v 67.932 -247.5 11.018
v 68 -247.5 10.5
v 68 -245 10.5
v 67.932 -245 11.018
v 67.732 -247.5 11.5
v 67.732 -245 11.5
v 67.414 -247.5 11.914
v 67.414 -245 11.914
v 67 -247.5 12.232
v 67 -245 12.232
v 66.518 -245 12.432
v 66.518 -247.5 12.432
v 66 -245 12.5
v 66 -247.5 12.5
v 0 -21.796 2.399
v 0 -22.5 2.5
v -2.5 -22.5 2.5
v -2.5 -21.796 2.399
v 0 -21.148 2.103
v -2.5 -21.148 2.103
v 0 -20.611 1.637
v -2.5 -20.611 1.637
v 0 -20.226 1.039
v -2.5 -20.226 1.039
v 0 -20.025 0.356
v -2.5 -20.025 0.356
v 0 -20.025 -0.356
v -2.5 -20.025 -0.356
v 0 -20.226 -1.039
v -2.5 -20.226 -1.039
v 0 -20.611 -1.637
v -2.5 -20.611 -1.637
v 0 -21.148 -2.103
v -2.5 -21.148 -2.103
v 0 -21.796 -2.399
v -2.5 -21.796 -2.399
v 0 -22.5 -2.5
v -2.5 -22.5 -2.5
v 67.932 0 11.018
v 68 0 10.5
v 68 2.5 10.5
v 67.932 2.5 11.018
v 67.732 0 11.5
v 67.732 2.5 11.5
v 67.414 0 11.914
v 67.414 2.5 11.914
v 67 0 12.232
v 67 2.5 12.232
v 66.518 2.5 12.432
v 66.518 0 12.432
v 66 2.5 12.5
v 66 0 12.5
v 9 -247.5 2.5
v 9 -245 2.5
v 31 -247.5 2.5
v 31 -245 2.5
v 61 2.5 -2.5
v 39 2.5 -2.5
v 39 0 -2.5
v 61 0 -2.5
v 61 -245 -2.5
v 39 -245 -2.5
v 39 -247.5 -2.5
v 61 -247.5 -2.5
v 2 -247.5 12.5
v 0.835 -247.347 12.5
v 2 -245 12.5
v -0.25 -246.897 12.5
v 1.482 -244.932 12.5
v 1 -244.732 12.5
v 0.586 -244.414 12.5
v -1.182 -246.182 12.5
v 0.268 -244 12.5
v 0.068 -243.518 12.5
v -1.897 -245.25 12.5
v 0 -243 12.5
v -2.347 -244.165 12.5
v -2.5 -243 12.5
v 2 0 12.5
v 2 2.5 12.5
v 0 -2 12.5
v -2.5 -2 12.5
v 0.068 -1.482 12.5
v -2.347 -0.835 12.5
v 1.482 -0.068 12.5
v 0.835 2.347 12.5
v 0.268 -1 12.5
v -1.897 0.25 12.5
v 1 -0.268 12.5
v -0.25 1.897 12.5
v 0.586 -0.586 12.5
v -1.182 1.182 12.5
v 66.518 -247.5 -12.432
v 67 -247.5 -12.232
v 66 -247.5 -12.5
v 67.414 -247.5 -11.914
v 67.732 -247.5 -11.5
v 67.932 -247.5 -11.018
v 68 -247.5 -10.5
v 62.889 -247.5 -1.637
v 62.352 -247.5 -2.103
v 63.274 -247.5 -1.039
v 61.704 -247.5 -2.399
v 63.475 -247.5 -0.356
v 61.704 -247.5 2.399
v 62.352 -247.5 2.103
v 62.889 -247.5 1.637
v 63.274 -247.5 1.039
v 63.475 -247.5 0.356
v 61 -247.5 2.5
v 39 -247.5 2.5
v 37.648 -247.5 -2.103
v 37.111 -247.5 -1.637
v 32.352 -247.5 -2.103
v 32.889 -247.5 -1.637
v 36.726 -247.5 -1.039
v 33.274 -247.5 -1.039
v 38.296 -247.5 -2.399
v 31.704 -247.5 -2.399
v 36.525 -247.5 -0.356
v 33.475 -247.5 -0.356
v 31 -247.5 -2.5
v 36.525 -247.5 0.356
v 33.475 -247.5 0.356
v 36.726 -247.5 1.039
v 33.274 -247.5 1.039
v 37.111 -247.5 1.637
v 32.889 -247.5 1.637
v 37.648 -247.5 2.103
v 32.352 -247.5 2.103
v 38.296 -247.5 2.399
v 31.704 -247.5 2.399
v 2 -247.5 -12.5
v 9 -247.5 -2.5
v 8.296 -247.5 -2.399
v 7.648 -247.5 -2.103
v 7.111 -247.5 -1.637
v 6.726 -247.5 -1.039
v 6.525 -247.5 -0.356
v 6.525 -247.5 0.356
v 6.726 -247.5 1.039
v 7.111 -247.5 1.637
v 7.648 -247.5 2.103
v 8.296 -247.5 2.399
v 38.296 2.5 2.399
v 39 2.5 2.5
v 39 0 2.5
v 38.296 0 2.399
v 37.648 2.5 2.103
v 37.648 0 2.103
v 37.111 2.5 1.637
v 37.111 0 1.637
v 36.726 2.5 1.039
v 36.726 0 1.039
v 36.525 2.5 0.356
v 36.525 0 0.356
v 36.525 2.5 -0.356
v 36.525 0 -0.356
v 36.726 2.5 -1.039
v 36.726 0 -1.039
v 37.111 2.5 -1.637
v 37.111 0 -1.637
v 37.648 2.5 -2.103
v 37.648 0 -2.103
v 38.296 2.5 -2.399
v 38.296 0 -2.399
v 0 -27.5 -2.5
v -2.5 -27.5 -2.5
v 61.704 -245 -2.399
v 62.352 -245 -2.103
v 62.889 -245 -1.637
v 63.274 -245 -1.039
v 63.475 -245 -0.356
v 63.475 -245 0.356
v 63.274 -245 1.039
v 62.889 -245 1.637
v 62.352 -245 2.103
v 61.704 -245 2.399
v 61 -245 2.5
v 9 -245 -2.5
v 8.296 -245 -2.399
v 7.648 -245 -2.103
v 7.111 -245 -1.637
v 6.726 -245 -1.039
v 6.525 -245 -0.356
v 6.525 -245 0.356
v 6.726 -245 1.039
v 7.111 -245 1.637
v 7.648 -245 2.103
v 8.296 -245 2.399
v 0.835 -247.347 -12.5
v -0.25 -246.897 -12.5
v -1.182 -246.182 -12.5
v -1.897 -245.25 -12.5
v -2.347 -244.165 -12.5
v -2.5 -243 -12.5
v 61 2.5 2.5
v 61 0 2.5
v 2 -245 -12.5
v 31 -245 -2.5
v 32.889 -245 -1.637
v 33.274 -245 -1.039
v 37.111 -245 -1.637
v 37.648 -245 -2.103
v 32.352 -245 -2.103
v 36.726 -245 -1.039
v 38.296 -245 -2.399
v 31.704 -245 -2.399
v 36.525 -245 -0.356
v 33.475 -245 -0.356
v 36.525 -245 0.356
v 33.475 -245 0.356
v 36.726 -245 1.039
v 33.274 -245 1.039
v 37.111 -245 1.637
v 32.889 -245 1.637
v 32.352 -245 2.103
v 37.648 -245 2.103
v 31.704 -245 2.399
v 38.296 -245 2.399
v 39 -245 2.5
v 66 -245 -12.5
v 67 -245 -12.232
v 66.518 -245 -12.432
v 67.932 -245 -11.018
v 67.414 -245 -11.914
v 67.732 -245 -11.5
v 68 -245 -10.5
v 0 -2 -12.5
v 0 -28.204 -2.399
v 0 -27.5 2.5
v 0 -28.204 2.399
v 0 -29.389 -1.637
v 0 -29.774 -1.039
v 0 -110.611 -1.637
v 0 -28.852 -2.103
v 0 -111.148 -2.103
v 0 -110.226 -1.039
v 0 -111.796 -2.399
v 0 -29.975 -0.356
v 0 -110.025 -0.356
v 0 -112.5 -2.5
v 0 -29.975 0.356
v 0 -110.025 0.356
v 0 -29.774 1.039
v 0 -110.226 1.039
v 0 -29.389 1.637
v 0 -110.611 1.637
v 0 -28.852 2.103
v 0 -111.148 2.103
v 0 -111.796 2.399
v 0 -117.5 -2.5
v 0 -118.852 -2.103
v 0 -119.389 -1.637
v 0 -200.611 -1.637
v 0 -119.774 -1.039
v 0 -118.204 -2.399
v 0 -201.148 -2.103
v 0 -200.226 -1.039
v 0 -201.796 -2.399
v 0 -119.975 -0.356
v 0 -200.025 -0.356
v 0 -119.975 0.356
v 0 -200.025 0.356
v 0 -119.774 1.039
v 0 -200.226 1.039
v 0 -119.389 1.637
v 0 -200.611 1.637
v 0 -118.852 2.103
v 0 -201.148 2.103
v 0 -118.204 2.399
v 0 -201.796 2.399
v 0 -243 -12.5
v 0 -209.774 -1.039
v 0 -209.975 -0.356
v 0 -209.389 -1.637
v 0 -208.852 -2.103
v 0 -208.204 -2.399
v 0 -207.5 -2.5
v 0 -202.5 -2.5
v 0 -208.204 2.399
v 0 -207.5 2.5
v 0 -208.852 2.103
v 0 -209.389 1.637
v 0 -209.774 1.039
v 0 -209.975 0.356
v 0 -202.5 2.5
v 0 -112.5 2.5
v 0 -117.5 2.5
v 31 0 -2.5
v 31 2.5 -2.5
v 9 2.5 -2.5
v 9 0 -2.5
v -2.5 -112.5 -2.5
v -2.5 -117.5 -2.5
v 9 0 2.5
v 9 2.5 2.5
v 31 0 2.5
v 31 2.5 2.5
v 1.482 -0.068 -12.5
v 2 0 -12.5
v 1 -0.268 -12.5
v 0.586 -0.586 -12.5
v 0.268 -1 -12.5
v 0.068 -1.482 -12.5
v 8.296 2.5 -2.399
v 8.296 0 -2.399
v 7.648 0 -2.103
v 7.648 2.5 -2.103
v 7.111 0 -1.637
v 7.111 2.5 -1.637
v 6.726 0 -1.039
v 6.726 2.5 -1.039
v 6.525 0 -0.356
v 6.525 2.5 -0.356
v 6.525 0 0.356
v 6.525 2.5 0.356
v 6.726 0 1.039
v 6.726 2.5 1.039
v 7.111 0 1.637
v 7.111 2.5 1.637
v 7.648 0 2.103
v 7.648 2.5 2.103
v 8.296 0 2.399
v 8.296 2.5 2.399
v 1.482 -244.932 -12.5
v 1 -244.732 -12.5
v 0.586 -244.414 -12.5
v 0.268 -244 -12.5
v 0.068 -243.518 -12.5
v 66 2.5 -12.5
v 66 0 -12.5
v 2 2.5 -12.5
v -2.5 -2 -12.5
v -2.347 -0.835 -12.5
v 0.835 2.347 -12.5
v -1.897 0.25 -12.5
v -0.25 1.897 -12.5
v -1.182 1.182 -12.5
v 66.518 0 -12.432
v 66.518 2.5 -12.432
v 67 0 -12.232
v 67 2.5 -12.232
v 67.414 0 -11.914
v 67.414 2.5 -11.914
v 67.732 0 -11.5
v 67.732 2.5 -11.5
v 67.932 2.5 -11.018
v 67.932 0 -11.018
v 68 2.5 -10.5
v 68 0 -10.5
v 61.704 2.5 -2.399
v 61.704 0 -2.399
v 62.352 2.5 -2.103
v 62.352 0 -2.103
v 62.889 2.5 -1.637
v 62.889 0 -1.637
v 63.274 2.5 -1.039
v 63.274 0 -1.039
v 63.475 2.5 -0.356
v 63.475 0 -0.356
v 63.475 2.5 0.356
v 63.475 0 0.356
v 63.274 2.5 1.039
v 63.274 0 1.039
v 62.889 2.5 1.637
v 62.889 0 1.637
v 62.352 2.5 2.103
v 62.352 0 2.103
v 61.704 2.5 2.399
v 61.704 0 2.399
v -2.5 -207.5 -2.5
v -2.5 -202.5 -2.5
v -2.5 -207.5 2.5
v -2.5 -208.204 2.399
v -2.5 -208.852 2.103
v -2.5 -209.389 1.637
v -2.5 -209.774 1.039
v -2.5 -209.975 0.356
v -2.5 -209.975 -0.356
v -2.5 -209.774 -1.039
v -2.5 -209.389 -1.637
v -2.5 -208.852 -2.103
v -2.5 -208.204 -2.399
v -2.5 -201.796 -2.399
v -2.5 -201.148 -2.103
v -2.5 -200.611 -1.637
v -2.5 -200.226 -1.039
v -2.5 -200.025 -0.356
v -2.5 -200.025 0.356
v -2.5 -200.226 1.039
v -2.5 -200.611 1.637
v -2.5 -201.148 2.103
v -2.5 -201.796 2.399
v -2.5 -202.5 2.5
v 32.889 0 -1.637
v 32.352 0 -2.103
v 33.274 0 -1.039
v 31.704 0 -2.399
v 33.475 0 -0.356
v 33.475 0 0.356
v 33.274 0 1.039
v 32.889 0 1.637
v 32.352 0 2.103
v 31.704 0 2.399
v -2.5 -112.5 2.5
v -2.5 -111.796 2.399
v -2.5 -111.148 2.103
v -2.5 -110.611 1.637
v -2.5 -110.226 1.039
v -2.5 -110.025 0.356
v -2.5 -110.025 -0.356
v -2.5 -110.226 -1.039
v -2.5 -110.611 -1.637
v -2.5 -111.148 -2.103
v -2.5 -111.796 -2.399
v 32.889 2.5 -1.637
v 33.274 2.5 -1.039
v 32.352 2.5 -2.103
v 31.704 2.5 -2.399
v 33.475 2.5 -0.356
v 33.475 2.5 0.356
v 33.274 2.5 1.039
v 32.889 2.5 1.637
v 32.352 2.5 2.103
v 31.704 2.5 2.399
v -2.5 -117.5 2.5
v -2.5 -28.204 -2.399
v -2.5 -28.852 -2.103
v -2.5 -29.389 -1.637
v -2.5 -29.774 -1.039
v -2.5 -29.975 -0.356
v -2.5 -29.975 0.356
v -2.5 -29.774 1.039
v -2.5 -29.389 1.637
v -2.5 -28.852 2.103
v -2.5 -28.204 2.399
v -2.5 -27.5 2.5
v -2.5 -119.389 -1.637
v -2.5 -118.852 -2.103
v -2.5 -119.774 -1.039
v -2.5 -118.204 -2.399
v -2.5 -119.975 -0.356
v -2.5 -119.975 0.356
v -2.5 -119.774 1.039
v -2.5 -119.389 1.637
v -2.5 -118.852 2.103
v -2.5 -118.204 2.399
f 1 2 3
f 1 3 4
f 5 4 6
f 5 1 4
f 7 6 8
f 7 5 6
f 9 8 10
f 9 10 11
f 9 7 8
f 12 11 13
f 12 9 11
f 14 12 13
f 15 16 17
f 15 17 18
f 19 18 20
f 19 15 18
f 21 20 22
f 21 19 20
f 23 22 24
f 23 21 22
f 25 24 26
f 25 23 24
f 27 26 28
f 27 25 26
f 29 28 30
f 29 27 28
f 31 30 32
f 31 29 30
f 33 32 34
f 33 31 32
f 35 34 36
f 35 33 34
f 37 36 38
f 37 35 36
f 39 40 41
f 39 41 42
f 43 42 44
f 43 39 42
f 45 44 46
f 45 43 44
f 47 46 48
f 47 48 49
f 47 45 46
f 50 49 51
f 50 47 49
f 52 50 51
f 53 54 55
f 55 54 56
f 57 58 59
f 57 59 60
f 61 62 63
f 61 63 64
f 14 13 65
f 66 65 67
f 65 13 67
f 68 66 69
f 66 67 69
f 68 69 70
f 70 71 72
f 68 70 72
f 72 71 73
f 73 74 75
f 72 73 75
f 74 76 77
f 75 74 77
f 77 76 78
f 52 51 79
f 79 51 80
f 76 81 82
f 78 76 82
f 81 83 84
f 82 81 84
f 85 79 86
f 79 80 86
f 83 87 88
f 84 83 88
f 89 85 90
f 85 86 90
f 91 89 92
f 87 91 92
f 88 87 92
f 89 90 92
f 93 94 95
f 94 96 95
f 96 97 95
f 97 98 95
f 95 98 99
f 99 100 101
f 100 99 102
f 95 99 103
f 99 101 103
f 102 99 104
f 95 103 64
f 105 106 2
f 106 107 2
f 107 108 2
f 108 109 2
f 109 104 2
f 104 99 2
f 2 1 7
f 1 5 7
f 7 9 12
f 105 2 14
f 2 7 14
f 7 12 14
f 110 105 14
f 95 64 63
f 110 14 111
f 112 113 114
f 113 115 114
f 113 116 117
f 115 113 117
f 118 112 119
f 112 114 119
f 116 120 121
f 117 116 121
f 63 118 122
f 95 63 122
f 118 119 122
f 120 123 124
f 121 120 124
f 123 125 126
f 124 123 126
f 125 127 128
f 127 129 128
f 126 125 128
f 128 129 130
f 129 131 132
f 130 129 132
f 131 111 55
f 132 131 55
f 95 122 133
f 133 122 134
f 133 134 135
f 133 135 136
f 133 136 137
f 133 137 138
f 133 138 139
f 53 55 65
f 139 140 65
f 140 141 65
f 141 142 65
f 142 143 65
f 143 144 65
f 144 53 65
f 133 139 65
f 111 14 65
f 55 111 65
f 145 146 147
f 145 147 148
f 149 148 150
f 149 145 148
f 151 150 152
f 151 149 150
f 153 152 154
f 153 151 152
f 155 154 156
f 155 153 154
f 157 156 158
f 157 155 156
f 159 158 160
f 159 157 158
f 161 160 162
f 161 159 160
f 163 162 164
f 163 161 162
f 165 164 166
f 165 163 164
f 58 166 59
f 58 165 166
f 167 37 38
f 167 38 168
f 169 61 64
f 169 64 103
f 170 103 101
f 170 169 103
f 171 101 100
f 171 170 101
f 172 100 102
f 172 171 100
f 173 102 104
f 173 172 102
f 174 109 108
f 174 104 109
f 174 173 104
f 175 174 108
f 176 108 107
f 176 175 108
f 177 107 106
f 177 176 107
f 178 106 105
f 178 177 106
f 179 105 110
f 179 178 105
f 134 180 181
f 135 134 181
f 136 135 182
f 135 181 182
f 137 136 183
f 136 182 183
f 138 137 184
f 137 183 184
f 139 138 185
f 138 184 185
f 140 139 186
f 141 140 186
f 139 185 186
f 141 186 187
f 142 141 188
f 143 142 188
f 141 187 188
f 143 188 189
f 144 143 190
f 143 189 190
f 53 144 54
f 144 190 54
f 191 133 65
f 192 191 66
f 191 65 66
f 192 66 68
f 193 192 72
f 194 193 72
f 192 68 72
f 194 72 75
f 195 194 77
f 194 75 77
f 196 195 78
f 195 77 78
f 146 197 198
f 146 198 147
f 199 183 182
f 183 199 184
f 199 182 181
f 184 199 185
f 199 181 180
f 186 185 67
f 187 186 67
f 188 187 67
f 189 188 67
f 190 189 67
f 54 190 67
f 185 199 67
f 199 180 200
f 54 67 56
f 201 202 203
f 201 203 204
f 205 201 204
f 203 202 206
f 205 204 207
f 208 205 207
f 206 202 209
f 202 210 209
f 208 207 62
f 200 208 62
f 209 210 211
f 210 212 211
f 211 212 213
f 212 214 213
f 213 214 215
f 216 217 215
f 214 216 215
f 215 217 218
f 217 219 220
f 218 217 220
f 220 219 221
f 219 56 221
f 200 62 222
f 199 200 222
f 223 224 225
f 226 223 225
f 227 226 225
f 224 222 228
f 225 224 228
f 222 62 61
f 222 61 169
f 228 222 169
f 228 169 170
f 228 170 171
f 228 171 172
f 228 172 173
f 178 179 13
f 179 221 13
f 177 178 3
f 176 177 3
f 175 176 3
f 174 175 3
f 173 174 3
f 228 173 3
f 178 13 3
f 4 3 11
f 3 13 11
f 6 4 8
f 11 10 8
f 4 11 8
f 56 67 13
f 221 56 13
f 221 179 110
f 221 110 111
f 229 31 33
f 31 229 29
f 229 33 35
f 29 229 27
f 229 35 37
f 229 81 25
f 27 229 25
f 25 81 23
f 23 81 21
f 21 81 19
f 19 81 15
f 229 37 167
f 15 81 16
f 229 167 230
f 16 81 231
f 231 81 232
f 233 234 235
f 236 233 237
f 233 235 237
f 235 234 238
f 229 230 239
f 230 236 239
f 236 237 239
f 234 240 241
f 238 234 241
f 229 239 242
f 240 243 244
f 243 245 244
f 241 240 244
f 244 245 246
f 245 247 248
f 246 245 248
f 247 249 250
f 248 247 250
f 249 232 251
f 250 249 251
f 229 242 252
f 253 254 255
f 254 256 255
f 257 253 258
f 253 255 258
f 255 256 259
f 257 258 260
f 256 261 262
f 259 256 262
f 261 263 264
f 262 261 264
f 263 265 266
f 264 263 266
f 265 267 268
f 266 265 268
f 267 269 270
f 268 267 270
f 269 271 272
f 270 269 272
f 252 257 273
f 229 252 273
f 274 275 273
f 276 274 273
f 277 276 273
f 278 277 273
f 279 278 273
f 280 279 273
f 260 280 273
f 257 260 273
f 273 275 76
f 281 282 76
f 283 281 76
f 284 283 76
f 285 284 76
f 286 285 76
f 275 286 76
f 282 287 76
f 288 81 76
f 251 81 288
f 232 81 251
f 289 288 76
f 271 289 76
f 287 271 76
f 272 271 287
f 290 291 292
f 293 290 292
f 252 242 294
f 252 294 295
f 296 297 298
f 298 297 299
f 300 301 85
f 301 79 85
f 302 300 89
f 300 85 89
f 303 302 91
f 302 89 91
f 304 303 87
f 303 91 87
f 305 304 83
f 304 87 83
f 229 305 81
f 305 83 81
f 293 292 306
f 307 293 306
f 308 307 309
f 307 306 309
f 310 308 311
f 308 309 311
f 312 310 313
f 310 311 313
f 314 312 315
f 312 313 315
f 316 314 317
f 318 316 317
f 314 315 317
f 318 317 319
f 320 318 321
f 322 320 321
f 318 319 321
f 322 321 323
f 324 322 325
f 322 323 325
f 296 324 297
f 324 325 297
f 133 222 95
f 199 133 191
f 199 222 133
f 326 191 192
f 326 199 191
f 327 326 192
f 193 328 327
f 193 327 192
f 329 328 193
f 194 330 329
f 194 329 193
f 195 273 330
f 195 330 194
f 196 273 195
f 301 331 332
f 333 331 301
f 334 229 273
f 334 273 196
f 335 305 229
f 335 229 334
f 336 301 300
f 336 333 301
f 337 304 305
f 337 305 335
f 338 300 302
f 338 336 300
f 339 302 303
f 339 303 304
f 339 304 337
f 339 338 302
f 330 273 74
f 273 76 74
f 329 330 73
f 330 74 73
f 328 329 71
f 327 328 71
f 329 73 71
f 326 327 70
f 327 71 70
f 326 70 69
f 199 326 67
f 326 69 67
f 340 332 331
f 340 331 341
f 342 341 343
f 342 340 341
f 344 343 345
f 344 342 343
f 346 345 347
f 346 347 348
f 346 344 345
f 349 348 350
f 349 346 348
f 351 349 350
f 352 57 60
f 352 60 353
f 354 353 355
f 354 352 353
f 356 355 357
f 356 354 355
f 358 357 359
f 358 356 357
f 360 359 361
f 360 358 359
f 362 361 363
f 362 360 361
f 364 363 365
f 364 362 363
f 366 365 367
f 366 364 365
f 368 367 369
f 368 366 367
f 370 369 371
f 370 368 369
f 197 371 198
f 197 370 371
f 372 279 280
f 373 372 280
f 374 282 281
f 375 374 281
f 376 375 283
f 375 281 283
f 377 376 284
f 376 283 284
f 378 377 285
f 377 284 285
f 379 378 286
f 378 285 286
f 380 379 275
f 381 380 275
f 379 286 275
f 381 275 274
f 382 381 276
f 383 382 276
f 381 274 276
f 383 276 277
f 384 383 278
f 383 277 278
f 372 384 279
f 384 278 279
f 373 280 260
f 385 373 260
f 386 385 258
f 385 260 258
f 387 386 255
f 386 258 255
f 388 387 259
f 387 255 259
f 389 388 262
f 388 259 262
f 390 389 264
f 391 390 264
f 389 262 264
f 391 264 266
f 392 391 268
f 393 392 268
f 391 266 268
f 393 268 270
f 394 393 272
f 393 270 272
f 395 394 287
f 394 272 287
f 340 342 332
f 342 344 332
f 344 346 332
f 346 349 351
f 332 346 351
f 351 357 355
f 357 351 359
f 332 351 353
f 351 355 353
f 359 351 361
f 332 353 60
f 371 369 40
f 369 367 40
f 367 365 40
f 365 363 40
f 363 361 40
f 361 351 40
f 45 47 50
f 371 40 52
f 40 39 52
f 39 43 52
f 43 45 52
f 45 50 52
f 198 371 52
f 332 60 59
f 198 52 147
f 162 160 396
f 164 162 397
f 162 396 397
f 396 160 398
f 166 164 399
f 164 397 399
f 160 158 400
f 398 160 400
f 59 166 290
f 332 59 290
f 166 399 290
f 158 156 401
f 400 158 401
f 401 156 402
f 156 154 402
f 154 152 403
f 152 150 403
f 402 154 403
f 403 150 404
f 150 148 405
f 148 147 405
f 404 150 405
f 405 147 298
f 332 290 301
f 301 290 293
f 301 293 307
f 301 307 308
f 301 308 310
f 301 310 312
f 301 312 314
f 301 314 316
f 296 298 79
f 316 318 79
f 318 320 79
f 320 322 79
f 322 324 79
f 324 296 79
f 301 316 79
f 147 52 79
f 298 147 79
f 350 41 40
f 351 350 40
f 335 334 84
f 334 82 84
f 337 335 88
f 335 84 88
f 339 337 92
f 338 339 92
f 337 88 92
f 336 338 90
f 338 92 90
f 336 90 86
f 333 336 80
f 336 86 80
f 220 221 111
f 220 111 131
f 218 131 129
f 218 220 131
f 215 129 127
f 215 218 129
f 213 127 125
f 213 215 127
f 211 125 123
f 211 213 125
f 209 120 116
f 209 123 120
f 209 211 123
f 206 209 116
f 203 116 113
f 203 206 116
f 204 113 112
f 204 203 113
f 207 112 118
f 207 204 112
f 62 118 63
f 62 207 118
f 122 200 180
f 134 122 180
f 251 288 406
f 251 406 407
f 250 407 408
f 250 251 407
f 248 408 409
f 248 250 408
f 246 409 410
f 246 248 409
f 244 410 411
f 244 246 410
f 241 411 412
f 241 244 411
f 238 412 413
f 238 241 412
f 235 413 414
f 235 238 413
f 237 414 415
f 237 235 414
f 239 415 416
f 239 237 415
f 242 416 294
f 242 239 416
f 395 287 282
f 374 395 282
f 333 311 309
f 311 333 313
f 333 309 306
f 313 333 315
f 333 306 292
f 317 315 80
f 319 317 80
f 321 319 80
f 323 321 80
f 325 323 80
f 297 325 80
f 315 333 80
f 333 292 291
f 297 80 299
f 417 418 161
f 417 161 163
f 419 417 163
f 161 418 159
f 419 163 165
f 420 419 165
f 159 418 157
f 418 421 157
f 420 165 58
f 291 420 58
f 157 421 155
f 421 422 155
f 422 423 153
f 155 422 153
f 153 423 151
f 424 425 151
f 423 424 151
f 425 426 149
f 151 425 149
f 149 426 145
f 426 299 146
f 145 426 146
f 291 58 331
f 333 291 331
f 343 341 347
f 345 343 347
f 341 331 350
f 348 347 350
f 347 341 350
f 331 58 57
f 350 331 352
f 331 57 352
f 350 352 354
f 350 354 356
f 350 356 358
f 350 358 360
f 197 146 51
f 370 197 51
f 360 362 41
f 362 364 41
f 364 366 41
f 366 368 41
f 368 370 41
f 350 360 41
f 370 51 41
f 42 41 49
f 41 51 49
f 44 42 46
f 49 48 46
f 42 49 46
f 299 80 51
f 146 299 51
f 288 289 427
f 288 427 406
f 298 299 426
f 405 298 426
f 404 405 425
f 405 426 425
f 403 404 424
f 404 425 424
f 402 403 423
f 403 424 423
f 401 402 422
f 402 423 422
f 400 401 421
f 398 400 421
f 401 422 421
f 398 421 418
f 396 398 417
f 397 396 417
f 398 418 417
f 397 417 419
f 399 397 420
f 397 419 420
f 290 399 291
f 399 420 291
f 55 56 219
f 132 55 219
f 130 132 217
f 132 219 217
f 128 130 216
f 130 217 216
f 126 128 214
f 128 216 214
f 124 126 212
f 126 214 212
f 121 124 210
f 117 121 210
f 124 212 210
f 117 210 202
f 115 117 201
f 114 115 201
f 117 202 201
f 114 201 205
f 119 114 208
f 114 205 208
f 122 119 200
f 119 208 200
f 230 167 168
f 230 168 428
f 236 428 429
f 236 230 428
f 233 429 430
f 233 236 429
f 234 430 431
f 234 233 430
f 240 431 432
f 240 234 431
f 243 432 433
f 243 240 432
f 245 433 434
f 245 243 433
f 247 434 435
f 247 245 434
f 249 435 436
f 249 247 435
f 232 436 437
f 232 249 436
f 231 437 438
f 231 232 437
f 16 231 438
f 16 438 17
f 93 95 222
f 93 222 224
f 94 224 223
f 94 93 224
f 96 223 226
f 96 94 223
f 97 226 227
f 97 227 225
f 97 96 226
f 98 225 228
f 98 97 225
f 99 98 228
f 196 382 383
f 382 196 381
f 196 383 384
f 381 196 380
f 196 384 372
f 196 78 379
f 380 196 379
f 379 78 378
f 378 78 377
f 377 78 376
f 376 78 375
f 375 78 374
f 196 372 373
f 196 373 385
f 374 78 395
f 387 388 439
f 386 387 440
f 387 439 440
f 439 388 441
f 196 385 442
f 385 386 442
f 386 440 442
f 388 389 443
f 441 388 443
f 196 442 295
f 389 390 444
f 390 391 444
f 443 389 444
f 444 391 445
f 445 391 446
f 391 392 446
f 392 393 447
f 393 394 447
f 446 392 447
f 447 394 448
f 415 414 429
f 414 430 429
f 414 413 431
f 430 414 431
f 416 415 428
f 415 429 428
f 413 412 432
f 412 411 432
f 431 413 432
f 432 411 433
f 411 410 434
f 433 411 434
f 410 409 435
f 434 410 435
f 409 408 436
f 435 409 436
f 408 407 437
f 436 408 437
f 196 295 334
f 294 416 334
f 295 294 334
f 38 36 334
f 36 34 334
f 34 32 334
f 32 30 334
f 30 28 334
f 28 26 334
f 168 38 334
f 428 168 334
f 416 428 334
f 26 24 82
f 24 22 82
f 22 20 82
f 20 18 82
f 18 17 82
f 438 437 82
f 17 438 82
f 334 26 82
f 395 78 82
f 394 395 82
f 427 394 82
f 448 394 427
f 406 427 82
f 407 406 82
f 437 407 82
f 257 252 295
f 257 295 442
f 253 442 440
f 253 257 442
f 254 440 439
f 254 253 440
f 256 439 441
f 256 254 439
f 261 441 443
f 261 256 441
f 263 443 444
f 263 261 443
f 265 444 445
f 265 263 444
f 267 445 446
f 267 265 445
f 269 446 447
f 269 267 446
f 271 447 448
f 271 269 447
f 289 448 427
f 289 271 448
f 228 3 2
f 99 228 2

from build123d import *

# Parameters (mm, degrees)
SM_BASE_FLANGE_1_DEPTH = 12.5
CUT_EXTRUDE_1_DEPTH    = 257.975679783
CUT_EXTRUDE_2_DEPTH    = 260.384367301
OTHER_START            = -247.5
OTHER_1_DEPTH          = 250


# Read off the part's stored shape, not the designer's step: 断开-边角1
# Sheet-metal steps are written as plain solids
with BuildPart() as part:
    # Sketch 1 → 基体-法兰1 (new, symmetric)
    with BuildSketch(Plane.XY):
        with BuildLine():
            Line((68, 0), (2, 0))
            ThreePointArc((2, 0), (0.585786438, -0.585786438), (0, -2))
            Line((0, -2), (0, -243))
            ThreePointArc((0, -243), (0.585786438, -244.414213562), (2, -245))
            Line((2, -245), (68, -245))
            Line((68, -245), (68, -247.5))
            Line((68, -247.5), (2, -247.5))
            ThreePointArc((2, -247.5), (-1.181980515, -246.181980515), (-2.5, -243))
            Line((-2.5, -243), (-2.5, -2))
            ThreePointArc((-2.5, -2), (-1.181980515, 1.181980515), (2, 2.5))
            Line((2, 2.5), (68, 2.5))
            Line((68, 2.5), (68, 0))
        make_face()
    extrude(amount=SM_BASE_FLANGE_1_DEPTH, both=True)

    # 草图4 → 切除-拉伸1 (cut, through all)
    with BuildSketch(Plane(origin=(0, 0, 0), x_dir=(0, 0, -1), z_dir=(1, 0, 0))):
        with BuildLine():
            Line((2.5, -22.5), (2.5, -27.5))
            ThreePointArc((2.5, -27.5), (0, -30), (-2.5, -27.5))
            Line((-2.5, -27.5), (-2.5, -22.5))
            ThreePointArc((-2.5, -22.5), (0, -20), (2.5, -22.5))
        make_face()
        with BuildLine():
            Line((2.5, -112.5), (2.5, -117.5))
            ThreePointArc((2.5, -117.5), (0, -120), (-2.5, -117.5))
            Line((-2.5, -117.5), (-2.5, -112.5))
            ThreePointArc((-2.5, -112.5), (0, -110), (2.5, -112.5))
        make_face()
        with BuildLine():
            Line((2.5, -207.5), (2.5, -202.5))
            ThreePointArc((2.5, -202.5), (0, -200), (-2.5, -202.5))
            Line((-2.5, -202.5), (-2.5, -207.5))
            ThreePointArc((-2.5, -207.5), (0, -210), (2.5, -207.5))
        make_face()
    extrude(amount=-CUT_EXTRUDE_1_DEPTH, mode=Mode.SUBTRACT)

    # 草图7 → 切除-拉伸2 (cut, through all)
    with BuildSketch(Plane(origin=(0, 2.5, 0), x_dir=(1, 0, 0), z_dir=(0, 1, 0))):
        with BuildLine():
            Line((39, 2.5), (61, 2.5))
            ThreePointArc((61, 2.5), (63.5, 0), (61, -2.5))
            Line((61, -2.5), (39, -2.5))
            ThreePointArc((39, -2.5), (36.5, 0), (39, 2.5))
        make_face()
        with BuildLine():
            Line((31, 2.5), (9, 2.5))
            ThreePointArc((9, 2.5), (6.5, 0), (9, -2.5))
            Line((9, -2.5), (31, -2.5))
            ThreePointArc((31, -2.5), (33.5, 0), (31, 2.5))
        make_face()
    extrude(amount=-CUT_EXTRUDE_2_DEPTH, mode=Mode.SUBTRACT)

    # Other 1 outline → Other 1 (cut)
    with BuildSketch(Plane(origin=(0, 0, 0), x_dir=(1, 0, 0), z_dir=(0, 1, 0)).offset(OTHER_START)):
        with BuildLine():
            Line((68, -12.5), (68, -10.5))
            ThreePointArc((68, -10.5), (67.414213562, -11.914213562), (66, -12.5))
            Line((66, -12.5), (68, -12.5))
        make_face()
        with BuildLine():
            ThreePointArc((66, 12.5), (67.414213562, 11.914213562), (68, 10.5))
            Line((68, 10.5), (68, 12.5))
            Line((68, 12.5), (66, 12.5))
        make_face()
    extrude(amount=OTHER_1_DEPTH, mode=Mode.SUBTRACT)


solid = part.part
